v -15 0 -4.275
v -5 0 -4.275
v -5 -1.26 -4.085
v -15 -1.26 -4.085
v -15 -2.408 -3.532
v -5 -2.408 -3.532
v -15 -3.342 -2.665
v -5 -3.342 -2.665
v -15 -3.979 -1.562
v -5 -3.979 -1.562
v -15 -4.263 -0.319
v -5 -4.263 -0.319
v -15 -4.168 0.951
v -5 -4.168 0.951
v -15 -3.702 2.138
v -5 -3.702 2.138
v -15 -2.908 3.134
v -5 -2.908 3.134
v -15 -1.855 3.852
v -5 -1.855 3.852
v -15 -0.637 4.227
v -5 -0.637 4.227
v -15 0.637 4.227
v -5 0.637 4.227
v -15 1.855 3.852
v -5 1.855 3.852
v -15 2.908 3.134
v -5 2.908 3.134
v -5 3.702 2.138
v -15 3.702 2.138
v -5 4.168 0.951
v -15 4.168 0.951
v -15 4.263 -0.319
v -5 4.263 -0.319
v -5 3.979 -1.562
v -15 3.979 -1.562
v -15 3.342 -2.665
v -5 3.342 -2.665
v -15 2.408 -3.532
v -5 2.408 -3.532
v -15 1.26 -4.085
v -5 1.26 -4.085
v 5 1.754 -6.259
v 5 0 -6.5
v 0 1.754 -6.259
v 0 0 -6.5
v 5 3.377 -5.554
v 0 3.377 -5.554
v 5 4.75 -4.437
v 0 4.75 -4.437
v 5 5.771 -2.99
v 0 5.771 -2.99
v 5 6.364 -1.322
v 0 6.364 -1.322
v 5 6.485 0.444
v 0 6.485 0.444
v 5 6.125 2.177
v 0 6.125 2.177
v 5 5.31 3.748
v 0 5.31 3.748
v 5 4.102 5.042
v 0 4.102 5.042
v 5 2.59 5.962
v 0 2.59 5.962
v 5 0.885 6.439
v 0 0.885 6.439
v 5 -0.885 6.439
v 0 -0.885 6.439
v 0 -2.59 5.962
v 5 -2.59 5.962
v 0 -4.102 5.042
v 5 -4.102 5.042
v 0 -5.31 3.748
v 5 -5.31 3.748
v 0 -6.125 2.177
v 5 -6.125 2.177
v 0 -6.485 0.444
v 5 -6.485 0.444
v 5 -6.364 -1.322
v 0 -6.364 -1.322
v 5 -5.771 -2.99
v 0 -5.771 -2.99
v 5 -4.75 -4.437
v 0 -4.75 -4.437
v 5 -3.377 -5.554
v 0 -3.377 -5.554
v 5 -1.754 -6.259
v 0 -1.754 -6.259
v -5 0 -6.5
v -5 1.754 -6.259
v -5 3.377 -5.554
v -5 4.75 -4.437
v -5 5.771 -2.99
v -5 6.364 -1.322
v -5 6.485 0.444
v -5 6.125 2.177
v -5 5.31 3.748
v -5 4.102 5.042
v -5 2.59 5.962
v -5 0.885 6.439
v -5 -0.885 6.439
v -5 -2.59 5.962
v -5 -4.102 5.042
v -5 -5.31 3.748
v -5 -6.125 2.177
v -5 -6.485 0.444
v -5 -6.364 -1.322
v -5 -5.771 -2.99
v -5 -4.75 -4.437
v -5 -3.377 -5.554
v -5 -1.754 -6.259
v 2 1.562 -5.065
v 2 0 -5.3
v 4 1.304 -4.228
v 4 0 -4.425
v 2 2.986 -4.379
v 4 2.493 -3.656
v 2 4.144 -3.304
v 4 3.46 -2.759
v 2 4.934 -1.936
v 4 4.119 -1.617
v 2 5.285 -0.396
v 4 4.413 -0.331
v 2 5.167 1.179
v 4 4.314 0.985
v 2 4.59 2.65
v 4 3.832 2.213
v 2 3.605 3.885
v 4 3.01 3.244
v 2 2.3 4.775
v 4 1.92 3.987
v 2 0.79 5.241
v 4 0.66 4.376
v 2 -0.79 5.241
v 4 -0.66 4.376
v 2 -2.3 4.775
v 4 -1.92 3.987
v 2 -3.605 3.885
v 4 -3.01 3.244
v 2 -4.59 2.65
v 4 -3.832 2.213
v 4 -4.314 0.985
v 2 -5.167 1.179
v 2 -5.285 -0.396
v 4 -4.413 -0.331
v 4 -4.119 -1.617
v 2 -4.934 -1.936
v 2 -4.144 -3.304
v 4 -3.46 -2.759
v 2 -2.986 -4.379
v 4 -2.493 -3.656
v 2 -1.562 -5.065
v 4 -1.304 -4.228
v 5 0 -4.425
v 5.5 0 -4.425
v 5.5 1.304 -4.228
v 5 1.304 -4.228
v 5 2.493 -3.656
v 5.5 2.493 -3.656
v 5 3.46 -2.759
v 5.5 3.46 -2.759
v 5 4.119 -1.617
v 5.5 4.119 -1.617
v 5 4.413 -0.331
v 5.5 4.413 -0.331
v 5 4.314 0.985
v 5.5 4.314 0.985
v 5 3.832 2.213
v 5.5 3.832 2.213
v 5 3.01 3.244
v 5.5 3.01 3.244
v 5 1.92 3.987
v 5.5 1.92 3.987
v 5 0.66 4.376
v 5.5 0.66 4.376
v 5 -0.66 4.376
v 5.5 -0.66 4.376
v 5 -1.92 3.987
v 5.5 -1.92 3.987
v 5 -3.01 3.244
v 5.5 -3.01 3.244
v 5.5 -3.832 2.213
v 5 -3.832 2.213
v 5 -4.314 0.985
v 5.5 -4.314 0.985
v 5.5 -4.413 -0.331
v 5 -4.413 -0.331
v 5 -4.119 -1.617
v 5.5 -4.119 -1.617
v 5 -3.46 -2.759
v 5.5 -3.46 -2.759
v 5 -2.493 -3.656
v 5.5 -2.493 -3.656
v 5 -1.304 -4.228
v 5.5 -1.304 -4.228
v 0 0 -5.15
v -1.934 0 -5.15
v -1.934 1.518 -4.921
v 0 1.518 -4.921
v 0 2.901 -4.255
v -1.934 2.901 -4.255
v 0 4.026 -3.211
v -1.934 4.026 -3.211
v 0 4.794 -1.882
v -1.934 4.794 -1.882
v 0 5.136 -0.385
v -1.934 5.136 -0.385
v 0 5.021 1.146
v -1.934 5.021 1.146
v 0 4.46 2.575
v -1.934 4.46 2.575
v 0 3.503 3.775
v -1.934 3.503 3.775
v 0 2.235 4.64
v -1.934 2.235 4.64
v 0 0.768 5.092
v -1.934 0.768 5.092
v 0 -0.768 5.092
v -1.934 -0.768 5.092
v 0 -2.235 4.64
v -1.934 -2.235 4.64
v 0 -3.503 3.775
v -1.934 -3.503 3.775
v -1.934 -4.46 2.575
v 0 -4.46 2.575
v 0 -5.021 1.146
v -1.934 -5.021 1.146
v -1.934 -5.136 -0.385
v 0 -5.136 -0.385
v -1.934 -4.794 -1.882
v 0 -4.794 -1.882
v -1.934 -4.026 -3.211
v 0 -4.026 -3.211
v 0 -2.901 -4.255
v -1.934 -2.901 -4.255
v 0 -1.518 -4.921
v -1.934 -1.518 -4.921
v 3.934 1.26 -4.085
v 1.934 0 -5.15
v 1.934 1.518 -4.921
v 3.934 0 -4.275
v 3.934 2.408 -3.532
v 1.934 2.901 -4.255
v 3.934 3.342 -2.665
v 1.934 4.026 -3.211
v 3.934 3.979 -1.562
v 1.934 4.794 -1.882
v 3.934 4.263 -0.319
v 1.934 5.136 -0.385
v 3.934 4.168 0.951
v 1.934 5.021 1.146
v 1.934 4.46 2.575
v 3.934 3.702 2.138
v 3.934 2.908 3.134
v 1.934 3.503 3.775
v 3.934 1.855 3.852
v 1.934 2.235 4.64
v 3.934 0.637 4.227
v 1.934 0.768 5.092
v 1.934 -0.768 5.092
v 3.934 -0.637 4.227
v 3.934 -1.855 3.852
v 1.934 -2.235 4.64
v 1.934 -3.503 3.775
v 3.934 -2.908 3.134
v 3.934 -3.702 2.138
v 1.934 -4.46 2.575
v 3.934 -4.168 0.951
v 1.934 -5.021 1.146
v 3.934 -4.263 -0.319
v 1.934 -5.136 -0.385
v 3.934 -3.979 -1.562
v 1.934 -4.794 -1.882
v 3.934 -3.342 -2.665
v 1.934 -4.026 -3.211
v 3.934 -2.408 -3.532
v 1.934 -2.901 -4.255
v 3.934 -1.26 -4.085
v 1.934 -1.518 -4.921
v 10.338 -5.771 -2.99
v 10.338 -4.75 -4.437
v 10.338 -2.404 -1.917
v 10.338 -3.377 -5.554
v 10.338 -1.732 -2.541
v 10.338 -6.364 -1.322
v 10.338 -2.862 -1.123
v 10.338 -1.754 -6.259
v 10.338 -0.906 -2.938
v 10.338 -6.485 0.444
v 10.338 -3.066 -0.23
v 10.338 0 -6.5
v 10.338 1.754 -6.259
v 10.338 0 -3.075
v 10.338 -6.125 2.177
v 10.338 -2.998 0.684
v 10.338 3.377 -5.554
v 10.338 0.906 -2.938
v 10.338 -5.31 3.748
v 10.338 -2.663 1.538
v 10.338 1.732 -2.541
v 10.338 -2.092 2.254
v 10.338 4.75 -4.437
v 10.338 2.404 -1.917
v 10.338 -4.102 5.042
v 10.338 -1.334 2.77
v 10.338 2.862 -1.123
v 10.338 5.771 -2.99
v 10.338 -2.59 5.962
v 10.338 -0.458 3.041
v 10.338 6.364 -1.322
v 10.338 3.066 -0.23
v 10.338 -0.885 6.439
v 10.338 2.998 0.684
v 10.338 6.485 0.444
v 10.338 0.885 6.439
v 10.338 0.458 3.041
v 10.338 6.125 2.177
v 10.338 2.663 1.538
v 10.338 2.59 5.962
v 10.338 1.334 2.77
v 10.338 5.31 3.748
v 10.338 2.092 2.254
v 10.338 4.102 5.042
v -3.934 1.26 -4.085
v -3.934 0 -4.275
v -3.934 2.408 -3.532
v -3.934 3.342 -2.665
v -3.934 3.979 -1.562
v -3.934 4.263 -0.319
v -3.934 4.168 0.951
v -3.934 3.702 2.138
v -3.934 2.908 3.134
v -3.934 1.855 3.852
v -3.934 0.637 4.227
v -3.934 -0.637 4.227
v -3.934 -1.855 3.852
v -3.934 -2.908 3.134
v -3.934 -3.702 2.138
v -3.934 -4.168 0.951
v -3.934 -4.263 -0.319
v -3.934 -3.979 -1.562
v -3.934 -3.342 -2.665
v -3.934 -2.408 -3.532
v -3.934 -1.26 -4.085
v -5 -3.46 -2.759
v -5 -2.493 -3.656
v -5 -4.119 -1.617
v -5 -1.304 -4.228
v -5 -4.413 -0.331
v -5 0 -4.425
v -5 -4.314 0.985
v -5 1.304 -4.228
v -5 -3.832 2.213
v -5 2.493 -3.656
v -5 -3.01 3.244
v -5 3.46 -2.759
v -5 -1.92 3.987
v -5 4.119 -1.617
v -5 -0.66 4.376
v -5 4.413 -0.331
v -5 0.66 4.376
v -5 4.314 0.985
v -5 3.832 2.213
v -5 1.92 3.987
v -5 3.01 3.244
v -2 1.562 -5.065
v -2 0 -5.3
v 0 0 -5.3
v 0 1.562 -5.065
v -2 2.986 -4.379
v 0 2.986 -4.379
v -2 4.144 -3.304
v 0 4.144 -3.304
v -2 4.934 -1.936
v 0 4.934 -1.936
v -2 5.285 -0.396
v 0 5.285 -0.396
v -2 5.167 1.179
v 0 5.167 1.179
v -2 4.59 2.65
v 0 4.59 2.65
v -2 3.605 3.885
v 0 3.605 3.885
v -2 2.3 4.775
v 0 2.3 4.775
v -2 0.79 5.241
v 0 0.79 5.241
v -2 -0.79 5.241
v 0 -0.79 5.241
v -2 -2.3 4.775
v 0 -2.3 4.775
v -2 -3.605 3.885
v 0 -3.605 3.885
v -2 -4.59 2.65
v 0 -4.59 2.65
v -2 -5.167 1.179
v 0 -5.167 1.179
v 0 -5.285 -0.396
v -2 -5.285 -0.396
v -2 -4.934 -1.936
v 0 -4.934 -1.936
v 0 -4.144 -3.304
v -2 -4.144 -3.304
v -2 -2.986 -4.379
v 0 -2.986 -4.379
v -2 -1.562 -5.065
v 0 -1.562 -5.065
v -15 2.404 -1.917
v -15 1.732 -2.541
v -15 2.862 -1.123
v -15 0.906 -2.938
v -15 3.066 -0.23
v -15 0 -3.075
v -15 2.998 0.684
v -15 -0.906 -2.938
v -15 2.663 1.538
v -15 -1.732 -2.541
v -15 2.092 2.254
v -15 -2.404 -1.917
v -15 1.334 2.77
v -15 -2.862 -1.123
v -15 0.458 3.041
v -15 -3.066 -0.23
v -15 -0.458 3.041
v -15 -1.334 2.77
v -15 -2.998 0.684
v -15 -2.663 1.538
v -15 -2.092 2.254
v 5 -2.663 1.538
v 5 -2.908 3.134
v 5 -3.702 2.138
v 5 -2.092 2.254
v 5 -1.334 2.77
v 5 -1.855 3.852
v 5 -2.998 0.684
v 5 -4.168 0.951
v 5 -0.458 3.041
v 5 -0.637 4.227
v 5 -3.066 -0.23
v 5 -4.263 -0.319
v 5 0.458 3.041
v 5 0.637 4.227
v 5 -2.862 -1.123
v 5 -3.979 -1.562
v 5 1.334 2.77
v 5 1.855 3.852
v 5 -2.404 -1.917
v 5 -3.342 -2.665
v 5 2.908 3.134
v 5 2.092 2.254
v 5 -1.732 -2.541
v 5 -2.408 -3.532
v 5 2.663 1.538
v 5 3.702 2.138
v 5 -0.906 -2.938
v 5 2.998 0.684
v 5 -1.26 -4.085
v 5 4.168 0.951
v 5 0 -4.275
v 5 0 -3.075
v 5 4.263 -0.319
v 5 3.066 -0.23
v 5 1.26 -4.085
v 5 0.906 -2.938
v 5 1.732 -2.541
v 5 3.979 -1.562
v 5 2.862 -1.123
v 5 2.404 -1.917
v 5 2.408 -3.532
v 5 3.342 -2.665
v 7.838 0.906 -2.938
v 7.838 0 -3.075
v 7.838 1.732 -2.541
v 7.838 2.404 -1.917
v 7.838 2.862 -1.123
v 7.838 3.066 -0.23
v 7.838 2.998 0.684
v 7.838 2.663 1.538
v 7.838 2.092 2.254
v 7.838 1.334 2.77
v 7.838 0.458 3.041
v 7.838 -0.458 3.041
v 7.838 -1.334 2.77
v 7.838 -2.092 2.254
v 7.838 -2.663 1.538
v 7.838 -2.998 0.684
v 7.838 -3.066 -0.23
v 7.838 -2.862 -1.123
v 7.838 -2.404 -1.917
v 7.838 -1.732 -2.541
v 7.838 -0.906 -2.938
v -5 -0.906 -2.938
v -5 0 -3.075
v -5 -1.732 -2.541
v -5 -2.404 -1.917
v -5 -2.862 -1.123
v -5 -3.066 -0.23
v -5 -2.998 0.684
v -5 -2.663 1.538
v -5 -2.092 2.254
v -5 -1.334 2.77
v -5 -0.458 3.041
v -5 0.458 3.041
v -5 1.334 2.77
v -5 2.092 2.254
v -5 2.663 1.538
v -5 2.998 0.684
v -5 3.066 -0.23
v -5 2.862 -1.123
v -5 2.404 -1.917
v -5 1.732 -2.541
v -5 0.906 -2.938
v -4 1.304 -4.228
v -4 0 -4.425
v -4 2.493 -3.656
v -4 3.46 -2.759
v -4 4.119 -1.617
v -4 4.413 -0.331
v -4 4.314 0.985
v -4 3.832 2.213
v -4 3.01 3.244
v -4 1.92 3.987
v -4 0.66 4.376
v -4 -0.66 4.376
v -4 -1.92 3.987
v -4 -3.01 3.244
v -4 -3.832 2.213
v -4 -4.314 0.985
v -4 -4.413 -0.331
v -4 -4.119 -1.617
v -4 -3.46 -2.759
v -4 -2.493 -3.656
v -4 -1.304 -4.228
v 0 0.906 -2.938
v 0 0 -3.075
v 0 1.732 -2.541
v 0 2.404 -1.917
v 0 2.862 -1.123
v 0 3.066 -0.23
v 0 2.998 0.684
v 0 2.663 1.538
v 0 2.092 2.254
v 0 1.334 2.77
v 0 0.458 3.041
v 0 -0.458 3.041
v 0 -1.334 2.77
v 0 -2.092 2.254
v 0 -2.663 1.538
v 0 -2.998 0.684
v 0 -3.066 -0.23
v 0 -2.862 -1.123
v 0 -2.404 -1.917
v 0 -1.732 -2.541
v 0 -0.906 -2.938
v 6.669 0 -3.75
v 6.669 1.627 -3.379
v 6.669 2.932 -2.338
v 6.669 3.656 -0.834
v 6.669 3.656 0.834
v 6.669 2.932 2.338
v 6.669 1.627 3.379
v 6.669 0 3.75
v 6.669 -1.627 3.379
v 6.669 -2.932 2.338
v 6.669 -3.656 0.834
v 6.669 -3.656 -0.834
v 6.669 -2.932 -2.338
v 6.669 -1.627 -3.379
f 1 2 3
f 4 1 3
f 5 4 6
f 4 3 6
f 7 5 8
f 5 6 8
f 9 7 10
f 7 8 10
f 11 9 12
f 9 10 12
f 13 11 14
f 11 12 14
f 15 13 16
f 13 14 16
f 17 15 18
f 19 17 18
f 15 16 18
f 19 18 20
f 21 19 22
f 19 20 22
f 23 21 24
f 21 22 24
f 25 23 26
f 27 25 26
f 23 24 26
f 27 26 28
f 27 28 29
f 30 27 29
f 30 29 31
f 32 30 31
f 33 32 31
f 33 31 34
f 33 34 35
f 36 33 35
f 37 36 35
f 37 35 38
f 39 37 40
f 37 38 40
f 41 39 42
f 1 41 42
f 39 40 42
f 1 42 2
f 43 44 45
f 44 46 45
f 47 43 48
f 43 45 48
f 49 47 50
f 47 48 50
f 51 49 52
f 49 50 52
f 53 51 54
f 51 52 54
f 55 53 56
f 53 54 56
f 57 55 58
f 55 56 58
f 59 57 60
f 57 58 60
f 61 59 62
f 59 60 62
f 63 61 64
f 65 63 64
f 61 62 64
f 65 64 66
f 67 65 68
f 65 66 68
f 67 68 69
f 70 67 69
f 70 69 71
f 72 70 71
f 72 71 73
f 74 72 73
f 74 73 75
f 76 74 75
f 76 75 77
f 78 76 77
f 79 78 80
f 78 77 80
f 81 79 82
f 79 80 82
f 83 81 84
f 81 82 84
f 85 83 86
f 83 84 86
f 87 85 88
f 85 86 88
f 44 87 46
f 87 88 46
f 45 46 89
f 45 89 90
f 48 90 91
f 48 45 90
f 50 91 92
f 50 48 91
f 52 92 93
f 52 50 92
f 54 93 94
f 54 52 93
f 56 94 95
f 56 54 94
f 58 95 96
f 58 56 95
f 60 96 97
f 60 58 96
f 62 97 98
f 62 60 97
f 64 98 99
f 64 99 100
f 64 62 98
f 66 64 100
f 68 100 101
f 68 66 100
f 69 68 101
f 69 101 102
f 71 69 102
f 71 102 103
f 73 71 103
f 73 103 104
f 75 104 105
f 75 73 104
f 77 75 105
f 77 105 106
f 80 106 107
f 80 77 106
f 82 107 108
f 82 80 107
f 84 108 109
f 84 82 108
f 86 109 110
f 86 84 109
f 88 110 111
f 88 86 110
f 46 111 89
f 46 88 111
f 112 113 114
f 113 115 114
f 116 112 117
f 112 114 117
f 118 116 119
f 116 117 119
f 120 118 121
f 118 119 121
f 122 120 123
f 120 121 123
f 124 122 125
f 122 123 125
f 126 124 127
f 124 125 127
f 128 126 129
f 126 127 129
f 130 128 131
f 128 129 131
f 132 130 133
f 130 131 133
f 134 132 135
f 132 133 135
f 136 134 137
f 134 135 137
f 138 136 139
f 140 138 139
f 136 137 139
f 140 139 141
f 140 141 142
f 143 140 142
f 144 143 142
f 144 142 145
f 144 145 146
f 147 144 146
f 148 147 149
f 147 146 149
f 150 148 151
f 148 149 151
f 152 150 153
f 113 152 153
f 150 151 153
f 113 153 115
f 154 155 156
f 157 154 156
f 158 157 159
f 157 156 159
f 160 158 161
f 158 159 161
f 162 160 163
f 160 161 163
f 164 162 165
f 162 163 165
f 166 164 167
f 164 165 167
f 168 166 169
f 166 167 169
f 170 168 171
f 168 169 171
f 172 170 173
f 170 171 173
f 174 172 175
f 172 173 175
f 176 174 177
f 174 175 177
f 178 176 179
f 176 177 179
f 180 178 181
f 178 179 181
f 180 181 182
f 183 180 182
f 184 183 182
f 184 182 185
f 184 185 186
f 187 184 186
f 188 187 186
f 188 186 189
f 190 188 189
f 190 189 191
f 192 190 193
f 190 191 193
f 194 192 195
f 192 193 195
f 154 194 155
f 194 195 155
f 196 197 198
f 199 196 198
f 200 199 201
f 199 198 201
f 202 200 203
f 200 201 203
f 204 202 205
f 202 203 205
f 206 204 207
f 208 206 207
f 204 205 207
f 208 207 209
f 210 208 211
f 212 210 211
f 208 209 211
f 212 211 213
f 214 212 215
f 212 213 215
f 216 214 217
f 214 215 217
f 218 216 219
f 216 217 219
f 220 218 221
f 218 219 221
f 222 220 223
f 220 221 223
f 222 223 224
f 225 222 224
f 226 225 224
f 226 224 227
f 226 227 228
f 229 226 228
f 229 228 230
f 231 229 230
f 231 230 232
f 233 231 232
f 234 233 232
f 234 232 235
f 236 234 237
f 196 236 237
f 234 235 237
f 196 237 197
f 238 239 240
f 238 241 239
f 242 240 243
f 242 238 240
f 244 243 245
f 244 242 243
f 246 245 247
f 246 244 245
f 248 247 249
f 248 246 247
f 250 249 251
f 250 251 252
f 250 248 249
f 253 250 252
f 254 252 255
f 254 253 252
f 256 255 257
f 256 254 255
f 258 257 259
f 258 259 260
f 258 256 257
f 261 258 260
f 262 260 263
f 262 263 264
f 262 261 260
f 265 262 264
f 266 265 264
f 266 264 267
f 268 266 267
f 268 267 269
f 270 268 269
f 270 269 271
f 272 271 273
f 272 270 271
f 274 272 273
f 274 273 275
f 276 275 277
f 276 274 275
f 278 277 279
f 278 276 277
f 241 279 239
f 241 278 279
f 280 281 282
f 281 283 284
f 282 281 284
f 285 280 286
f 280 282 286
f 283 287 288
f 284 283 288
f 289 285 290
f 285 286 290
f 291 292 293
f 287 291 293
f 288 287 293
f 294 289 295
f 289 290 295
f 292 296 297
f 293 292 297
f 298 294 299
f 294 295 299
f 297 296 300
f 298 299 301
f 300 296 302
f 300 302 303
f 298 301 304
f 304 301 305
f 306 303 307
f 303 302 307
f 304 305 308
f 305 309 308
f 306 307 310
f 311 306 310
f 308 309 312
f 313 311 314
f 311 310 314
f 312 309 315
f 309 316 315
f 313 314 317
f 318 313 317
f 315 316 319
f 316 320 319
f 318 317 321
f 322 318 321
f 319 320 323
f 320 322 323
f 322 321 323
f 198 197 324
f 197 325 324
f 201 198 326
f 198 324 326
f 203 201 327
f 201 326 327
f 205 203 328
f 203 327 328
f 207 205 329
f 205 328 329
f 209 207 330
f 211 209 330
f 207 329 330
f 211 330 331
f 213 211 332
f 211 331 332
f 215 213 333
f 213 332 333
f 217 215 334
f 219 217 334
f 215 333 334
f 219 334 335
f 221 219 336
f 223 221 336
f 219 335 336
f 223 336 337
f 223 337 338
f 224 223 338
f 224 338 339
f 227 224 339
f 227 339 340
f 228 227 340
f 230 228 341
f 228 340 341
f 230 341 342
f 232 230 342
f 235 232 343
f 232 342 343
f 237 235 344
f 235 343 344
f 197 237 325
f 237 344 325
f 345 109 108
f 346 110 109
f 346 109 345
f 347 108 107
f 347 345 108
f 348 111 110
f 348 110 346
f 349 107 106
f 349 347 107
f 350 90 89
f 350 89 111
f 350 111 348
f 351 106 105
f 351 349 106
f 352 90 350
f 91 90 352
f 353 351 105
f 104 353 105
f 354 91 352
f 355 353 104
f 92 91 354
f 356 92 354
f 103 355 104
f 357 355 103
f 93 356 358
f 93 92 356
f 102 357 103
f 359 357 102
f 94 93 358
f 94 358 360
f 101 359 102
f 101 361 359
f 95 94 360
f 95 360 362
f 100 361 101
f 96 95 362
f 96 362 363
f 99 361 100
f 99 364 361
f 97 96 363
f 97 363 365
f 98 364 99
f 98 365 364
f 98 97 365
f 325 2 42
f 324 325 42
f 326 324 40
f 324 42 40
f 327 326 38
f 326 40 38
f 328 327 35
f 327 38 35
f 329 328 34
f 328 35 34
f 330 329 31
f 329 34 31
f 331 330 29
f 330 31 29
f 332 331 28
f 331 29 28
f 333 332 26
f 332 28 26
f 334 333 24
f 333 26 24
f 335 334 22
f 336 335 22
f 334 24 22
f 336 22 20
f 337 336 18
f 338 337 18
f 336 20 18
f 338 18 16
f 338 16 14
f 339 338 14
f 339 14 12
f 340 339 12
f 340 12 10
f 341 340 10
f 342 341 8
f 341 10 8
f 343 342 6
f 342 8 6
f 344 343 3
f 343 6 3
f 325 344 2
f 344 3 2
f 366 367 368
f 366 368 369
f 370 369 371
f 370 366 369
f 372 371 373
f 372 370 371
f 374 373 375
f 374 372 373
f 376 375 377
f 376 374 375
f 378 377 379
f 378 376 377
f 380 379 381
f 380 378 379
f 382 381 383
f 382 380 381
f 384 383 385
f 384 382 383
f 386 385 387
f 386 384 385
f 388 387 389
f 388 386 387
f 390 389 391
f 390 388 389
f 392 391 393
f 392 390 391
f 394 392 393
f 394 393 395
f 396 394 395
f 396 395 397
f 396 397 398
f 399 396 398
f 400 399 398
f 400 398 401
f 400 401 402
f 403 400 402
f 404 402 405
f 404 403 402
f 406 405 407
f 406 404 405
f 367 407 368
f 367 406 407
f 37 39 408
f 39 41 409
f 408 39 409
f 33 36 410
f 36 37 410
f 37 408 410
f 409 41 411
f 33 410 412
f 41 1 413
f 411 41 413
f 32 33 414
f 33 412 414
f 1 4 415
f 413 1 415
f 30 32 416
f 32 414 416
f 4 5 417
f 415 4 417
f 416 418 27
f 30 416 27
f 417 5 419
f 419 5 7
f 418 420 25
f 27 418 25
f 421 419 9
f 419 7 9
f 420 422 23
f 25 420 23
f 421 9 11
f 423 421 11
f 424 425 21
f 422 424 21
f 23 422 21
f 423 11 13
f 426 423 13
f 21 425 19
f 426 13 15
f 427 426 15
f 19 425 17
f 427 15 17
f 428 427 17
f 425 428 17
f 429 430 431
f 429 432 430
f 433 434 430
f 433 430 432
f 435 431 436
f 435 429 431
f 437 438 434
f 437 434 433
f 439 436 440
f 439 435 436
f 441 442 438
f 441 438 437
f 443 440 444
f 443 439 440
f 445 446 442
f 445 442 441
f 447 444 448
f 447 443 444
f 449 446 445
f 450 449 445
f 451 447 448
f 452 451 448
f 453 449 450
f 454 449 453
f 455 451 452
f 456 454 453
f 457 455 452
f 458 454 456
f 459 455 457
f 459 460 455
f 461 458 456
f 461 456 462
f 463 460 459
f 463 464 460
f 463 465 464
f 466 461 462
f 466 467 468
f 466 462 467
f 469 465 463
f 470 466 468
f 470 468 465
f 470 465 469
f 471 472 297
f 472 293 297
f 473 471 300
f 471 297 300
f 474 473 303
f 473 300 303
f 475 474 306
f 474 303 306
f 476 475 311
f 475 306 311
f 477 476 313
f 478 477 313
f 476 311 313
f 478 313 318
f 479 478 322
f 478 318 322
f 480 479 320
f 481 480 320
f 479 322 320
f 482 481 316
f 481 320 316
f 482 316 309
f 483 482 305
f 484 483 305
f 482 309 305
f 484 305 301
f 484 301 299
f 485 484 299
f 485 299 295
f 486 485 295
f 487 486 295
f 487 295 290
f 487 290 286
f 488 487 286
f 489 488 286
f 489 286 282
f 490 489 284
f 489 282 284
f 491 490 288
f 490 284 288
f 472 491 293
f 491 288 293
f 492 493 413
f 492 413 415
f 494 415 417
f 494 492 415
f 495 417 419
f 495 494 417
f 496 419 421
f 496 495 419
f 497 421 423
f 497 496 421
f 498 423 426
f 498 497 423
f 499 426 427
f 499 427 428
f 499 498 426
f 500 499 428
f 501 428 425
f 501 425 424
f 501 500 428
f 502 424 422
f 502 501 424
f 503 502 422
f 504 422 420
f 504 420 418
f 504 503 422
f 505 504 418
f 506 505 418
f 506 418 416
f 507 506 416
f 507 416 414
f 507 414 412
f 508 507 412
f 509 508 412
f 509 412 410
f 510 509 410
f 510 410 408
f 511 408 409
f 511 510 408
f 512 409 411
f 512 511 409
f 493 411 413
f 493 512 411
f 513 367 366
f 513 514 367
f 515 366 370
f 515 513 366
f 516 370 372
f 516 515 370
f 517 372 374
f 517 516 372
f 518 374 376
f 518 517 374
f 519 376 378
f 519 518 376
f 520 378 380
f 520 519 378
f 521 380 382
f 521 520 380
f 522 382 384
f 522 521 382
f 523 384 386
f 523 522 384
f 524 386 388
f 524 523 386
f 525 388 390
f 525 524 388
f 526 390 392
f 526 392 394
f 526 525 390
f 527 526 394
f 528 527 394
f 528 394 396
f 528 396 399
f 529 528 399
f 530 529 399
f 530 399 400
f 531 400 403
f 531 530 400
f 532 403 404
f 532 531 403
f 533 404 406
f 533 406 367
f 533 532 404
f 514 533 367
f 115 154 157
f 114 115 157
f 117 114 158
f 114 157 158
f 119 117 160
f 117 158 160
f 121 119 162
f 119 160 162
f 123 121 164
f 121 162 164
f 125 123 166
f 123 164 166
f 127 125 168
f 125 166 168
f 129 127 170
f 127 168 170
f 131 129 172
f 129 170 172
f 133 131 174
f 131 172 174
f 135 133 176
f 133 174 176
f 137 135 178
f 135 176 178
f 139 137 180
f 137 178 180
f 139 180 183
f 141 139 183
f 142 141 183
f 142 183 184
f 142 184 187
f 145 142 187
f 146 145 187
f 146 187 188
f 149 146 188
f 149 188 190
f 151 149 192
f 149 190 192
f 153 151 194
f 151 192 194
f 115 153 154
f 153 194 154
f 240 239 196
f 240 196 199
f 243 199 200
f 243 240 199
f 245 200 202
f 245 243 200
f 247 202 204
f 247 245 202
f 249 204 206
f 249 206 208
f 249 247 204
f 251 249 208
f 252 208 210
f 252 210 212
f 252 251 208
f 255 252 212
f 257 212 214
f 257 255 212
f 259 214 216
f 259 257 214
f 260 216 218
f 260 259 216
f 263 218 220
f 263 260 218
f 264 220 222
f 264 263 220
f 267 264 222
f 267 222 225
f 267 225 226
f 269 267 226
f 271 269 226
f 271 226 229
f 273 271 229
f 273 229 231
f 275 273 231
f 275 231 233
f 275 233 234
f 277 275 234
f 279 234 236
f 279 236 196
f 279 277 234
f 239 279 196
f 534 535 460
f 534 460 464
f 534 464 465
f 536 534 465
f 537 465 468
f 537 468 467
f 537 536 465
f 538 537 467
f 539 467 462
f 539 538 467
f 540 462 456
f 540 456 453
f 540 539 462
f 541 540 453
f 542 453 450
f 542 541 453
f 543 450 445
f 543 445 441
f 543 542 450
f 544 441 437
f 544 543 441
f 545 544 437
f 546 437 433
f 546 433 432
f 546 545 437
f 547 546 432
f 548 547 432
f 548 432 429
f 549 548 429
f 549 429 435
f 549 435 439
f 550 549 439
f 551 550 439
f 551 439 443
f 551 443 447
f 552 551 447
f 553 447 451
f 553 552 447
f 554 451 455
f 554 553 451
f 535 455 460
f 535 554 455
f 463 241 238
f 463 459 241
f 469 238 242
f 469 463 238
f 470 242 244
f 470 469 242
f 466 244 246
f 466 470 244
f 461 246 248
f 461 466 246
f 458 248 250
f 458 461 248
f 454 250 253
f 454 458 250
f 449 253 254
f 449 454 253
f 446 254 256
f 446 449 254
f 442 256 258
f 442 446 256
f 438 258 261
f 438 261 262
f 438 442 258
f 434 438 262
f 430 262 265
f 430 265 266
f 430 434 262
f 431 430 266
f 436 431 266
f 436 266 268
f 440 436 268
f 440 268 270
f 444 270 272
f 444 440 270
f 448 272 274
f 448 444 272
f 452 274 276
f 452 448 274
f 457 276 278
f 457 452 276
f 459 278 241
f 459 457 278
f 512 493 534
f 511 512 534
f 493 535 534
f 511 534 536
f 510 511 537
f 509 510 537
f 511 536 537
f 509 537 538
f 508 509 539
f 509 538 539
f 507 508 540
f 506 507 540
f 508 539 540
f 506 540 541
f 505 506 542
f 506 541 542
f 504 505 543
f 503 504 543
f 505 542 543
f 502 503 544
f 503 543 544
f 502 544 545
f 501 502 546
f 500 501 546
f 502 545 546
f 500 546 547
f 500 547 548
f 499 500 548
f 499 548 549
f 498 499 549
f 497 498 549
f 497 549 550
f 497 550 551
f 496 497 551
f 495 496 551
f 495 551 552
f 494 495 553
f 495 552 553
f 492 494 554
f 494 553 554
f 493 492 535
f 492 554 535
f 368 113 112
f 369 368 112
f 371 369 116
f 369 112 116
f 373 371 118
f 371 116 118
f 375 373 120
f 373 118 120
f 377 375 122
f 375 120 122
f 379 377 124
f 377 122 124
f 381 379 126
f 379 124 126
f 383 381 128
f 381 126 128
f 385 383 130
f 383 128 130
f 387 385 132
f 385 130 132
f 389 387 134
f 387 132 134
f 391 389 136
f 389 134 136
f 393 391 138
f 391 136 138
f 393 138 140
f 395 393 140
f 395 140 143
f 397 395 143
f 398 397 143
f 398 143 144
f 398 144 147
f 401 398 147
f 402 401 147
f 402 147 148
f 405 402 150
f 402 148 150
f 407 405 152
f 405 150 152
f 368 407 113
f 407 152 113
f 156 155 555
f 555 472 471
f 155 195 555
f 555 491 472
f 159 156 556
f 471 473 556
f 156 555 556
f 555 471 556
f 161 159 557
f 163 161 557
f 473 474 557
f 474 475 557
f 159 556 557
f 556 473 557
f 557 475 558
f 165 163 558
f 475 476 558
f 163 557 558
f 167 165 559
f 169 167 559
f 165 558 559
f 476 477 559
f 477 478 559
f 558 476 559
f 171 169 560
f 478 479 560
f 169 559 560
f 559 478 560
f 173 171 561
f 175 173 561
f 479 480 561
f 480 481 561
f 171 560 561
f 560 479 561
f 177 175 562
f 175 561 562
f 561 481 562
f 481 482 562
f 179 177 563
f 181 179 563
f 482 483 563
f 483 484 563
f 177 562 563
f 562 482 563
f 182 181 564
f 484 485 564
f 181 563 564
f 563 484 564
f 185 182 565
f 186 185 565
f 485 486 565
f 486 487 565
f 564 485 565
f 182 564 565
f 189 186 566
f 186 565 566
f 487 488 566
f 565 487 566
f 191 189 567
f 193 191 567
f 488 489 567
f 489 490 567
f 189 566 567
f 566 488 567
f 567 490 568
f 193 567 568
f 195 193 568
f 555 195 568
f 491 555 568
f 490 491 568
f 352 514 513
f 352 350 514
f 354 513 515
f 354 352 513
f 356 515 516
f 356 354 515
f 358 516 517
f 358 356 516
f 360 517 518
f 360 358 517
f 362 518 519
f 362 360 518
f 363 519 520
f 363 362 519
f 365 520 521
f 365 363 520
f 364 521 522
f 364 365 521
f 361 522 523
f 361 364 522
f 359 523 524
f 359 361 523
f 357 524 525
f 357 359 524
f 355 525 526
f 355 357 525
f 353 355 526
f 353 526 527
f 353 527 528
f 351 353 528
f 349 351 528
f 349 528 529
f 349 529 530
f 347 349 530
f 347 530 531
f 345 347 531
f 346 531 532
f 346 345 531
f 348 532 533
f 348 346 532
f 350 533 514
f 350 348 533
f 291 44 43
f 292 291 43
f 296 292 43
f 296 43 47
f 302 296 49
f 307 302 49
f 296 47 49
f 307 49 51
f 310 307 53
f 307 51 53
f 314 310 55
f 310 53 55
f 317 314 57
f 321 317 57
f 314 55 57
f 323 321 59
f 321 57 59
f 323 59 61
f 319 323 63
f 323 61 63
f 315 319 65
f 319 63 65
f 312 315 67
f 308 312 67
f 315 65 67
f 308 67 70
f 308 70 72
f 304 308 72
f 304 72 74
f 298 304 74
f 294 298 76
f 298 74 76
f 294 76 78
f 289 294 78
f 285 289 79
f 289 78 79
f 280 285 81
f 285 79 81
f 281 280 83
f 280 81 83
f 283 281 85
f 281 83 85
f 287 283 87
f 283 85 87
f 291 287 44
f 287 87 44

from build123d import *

# Parameters (mm, degrees)
SKETCH3_W = 10
SKETCH3_H = 1.2


with BuildPart() as part:
    # Sketch1 → Revolve1 (revolve)
    with BuildSketch(Plane(origin=(0, 0, 0), x_dir=(1, 0, 0), z_dir=(0, 1, 0))):
        Polygon((-5, 4.425), (-5, 6.5), (0, 6.5), (0, 5.3), (-2, 5.3), (-4, 4.425), align=None)
        Polygon((0, 5.15), (-1.934375, 5.15), (-3.934375, 4.275), (-5, 4.275), (-5, 3.075), (0, 3.075), align=None)
    revolve1 = revolve(axis=Axis((0, 0, 0), (1, 0, 0)))

    # Mirror1: Revolve1 across plane
    add(revolve1.mirror(Plane(origin=(0, 0, 0), x_dir=(0, 0, 1), z_dir=(1, 0, 0))))

    # Sketch2 → Revolve2 (revolve)
    with BuildSketch(Plane(origin=(0, 0, 0), x_dir=(1, 0, 0), z_dir=(0, 1, 0))):
        Polygon((10.33826859, 6.5), (5, 6.5), (5, 4.425), (5.5, 4.425), (7.83826859, 3.075), (10.33826859, 3.075), align=None)
    revolve(axis=Axis((0, 0, 0), (1, 0, 0)))

    # Sketch3 → Revolve3 (revolve)
    with BuildSketch(Plane(origin=(0, 0, 0), x_dir=(1, 0, 0), z_dir=(0, 1, 0))):
        with Locations((-10, 3.675)):
            Rectangle(SKETCH3_W, SKETCH3_H)
    revolve(axis=Axis((0, 0, 0), (-1, 0, 0)))


solid = part.part
